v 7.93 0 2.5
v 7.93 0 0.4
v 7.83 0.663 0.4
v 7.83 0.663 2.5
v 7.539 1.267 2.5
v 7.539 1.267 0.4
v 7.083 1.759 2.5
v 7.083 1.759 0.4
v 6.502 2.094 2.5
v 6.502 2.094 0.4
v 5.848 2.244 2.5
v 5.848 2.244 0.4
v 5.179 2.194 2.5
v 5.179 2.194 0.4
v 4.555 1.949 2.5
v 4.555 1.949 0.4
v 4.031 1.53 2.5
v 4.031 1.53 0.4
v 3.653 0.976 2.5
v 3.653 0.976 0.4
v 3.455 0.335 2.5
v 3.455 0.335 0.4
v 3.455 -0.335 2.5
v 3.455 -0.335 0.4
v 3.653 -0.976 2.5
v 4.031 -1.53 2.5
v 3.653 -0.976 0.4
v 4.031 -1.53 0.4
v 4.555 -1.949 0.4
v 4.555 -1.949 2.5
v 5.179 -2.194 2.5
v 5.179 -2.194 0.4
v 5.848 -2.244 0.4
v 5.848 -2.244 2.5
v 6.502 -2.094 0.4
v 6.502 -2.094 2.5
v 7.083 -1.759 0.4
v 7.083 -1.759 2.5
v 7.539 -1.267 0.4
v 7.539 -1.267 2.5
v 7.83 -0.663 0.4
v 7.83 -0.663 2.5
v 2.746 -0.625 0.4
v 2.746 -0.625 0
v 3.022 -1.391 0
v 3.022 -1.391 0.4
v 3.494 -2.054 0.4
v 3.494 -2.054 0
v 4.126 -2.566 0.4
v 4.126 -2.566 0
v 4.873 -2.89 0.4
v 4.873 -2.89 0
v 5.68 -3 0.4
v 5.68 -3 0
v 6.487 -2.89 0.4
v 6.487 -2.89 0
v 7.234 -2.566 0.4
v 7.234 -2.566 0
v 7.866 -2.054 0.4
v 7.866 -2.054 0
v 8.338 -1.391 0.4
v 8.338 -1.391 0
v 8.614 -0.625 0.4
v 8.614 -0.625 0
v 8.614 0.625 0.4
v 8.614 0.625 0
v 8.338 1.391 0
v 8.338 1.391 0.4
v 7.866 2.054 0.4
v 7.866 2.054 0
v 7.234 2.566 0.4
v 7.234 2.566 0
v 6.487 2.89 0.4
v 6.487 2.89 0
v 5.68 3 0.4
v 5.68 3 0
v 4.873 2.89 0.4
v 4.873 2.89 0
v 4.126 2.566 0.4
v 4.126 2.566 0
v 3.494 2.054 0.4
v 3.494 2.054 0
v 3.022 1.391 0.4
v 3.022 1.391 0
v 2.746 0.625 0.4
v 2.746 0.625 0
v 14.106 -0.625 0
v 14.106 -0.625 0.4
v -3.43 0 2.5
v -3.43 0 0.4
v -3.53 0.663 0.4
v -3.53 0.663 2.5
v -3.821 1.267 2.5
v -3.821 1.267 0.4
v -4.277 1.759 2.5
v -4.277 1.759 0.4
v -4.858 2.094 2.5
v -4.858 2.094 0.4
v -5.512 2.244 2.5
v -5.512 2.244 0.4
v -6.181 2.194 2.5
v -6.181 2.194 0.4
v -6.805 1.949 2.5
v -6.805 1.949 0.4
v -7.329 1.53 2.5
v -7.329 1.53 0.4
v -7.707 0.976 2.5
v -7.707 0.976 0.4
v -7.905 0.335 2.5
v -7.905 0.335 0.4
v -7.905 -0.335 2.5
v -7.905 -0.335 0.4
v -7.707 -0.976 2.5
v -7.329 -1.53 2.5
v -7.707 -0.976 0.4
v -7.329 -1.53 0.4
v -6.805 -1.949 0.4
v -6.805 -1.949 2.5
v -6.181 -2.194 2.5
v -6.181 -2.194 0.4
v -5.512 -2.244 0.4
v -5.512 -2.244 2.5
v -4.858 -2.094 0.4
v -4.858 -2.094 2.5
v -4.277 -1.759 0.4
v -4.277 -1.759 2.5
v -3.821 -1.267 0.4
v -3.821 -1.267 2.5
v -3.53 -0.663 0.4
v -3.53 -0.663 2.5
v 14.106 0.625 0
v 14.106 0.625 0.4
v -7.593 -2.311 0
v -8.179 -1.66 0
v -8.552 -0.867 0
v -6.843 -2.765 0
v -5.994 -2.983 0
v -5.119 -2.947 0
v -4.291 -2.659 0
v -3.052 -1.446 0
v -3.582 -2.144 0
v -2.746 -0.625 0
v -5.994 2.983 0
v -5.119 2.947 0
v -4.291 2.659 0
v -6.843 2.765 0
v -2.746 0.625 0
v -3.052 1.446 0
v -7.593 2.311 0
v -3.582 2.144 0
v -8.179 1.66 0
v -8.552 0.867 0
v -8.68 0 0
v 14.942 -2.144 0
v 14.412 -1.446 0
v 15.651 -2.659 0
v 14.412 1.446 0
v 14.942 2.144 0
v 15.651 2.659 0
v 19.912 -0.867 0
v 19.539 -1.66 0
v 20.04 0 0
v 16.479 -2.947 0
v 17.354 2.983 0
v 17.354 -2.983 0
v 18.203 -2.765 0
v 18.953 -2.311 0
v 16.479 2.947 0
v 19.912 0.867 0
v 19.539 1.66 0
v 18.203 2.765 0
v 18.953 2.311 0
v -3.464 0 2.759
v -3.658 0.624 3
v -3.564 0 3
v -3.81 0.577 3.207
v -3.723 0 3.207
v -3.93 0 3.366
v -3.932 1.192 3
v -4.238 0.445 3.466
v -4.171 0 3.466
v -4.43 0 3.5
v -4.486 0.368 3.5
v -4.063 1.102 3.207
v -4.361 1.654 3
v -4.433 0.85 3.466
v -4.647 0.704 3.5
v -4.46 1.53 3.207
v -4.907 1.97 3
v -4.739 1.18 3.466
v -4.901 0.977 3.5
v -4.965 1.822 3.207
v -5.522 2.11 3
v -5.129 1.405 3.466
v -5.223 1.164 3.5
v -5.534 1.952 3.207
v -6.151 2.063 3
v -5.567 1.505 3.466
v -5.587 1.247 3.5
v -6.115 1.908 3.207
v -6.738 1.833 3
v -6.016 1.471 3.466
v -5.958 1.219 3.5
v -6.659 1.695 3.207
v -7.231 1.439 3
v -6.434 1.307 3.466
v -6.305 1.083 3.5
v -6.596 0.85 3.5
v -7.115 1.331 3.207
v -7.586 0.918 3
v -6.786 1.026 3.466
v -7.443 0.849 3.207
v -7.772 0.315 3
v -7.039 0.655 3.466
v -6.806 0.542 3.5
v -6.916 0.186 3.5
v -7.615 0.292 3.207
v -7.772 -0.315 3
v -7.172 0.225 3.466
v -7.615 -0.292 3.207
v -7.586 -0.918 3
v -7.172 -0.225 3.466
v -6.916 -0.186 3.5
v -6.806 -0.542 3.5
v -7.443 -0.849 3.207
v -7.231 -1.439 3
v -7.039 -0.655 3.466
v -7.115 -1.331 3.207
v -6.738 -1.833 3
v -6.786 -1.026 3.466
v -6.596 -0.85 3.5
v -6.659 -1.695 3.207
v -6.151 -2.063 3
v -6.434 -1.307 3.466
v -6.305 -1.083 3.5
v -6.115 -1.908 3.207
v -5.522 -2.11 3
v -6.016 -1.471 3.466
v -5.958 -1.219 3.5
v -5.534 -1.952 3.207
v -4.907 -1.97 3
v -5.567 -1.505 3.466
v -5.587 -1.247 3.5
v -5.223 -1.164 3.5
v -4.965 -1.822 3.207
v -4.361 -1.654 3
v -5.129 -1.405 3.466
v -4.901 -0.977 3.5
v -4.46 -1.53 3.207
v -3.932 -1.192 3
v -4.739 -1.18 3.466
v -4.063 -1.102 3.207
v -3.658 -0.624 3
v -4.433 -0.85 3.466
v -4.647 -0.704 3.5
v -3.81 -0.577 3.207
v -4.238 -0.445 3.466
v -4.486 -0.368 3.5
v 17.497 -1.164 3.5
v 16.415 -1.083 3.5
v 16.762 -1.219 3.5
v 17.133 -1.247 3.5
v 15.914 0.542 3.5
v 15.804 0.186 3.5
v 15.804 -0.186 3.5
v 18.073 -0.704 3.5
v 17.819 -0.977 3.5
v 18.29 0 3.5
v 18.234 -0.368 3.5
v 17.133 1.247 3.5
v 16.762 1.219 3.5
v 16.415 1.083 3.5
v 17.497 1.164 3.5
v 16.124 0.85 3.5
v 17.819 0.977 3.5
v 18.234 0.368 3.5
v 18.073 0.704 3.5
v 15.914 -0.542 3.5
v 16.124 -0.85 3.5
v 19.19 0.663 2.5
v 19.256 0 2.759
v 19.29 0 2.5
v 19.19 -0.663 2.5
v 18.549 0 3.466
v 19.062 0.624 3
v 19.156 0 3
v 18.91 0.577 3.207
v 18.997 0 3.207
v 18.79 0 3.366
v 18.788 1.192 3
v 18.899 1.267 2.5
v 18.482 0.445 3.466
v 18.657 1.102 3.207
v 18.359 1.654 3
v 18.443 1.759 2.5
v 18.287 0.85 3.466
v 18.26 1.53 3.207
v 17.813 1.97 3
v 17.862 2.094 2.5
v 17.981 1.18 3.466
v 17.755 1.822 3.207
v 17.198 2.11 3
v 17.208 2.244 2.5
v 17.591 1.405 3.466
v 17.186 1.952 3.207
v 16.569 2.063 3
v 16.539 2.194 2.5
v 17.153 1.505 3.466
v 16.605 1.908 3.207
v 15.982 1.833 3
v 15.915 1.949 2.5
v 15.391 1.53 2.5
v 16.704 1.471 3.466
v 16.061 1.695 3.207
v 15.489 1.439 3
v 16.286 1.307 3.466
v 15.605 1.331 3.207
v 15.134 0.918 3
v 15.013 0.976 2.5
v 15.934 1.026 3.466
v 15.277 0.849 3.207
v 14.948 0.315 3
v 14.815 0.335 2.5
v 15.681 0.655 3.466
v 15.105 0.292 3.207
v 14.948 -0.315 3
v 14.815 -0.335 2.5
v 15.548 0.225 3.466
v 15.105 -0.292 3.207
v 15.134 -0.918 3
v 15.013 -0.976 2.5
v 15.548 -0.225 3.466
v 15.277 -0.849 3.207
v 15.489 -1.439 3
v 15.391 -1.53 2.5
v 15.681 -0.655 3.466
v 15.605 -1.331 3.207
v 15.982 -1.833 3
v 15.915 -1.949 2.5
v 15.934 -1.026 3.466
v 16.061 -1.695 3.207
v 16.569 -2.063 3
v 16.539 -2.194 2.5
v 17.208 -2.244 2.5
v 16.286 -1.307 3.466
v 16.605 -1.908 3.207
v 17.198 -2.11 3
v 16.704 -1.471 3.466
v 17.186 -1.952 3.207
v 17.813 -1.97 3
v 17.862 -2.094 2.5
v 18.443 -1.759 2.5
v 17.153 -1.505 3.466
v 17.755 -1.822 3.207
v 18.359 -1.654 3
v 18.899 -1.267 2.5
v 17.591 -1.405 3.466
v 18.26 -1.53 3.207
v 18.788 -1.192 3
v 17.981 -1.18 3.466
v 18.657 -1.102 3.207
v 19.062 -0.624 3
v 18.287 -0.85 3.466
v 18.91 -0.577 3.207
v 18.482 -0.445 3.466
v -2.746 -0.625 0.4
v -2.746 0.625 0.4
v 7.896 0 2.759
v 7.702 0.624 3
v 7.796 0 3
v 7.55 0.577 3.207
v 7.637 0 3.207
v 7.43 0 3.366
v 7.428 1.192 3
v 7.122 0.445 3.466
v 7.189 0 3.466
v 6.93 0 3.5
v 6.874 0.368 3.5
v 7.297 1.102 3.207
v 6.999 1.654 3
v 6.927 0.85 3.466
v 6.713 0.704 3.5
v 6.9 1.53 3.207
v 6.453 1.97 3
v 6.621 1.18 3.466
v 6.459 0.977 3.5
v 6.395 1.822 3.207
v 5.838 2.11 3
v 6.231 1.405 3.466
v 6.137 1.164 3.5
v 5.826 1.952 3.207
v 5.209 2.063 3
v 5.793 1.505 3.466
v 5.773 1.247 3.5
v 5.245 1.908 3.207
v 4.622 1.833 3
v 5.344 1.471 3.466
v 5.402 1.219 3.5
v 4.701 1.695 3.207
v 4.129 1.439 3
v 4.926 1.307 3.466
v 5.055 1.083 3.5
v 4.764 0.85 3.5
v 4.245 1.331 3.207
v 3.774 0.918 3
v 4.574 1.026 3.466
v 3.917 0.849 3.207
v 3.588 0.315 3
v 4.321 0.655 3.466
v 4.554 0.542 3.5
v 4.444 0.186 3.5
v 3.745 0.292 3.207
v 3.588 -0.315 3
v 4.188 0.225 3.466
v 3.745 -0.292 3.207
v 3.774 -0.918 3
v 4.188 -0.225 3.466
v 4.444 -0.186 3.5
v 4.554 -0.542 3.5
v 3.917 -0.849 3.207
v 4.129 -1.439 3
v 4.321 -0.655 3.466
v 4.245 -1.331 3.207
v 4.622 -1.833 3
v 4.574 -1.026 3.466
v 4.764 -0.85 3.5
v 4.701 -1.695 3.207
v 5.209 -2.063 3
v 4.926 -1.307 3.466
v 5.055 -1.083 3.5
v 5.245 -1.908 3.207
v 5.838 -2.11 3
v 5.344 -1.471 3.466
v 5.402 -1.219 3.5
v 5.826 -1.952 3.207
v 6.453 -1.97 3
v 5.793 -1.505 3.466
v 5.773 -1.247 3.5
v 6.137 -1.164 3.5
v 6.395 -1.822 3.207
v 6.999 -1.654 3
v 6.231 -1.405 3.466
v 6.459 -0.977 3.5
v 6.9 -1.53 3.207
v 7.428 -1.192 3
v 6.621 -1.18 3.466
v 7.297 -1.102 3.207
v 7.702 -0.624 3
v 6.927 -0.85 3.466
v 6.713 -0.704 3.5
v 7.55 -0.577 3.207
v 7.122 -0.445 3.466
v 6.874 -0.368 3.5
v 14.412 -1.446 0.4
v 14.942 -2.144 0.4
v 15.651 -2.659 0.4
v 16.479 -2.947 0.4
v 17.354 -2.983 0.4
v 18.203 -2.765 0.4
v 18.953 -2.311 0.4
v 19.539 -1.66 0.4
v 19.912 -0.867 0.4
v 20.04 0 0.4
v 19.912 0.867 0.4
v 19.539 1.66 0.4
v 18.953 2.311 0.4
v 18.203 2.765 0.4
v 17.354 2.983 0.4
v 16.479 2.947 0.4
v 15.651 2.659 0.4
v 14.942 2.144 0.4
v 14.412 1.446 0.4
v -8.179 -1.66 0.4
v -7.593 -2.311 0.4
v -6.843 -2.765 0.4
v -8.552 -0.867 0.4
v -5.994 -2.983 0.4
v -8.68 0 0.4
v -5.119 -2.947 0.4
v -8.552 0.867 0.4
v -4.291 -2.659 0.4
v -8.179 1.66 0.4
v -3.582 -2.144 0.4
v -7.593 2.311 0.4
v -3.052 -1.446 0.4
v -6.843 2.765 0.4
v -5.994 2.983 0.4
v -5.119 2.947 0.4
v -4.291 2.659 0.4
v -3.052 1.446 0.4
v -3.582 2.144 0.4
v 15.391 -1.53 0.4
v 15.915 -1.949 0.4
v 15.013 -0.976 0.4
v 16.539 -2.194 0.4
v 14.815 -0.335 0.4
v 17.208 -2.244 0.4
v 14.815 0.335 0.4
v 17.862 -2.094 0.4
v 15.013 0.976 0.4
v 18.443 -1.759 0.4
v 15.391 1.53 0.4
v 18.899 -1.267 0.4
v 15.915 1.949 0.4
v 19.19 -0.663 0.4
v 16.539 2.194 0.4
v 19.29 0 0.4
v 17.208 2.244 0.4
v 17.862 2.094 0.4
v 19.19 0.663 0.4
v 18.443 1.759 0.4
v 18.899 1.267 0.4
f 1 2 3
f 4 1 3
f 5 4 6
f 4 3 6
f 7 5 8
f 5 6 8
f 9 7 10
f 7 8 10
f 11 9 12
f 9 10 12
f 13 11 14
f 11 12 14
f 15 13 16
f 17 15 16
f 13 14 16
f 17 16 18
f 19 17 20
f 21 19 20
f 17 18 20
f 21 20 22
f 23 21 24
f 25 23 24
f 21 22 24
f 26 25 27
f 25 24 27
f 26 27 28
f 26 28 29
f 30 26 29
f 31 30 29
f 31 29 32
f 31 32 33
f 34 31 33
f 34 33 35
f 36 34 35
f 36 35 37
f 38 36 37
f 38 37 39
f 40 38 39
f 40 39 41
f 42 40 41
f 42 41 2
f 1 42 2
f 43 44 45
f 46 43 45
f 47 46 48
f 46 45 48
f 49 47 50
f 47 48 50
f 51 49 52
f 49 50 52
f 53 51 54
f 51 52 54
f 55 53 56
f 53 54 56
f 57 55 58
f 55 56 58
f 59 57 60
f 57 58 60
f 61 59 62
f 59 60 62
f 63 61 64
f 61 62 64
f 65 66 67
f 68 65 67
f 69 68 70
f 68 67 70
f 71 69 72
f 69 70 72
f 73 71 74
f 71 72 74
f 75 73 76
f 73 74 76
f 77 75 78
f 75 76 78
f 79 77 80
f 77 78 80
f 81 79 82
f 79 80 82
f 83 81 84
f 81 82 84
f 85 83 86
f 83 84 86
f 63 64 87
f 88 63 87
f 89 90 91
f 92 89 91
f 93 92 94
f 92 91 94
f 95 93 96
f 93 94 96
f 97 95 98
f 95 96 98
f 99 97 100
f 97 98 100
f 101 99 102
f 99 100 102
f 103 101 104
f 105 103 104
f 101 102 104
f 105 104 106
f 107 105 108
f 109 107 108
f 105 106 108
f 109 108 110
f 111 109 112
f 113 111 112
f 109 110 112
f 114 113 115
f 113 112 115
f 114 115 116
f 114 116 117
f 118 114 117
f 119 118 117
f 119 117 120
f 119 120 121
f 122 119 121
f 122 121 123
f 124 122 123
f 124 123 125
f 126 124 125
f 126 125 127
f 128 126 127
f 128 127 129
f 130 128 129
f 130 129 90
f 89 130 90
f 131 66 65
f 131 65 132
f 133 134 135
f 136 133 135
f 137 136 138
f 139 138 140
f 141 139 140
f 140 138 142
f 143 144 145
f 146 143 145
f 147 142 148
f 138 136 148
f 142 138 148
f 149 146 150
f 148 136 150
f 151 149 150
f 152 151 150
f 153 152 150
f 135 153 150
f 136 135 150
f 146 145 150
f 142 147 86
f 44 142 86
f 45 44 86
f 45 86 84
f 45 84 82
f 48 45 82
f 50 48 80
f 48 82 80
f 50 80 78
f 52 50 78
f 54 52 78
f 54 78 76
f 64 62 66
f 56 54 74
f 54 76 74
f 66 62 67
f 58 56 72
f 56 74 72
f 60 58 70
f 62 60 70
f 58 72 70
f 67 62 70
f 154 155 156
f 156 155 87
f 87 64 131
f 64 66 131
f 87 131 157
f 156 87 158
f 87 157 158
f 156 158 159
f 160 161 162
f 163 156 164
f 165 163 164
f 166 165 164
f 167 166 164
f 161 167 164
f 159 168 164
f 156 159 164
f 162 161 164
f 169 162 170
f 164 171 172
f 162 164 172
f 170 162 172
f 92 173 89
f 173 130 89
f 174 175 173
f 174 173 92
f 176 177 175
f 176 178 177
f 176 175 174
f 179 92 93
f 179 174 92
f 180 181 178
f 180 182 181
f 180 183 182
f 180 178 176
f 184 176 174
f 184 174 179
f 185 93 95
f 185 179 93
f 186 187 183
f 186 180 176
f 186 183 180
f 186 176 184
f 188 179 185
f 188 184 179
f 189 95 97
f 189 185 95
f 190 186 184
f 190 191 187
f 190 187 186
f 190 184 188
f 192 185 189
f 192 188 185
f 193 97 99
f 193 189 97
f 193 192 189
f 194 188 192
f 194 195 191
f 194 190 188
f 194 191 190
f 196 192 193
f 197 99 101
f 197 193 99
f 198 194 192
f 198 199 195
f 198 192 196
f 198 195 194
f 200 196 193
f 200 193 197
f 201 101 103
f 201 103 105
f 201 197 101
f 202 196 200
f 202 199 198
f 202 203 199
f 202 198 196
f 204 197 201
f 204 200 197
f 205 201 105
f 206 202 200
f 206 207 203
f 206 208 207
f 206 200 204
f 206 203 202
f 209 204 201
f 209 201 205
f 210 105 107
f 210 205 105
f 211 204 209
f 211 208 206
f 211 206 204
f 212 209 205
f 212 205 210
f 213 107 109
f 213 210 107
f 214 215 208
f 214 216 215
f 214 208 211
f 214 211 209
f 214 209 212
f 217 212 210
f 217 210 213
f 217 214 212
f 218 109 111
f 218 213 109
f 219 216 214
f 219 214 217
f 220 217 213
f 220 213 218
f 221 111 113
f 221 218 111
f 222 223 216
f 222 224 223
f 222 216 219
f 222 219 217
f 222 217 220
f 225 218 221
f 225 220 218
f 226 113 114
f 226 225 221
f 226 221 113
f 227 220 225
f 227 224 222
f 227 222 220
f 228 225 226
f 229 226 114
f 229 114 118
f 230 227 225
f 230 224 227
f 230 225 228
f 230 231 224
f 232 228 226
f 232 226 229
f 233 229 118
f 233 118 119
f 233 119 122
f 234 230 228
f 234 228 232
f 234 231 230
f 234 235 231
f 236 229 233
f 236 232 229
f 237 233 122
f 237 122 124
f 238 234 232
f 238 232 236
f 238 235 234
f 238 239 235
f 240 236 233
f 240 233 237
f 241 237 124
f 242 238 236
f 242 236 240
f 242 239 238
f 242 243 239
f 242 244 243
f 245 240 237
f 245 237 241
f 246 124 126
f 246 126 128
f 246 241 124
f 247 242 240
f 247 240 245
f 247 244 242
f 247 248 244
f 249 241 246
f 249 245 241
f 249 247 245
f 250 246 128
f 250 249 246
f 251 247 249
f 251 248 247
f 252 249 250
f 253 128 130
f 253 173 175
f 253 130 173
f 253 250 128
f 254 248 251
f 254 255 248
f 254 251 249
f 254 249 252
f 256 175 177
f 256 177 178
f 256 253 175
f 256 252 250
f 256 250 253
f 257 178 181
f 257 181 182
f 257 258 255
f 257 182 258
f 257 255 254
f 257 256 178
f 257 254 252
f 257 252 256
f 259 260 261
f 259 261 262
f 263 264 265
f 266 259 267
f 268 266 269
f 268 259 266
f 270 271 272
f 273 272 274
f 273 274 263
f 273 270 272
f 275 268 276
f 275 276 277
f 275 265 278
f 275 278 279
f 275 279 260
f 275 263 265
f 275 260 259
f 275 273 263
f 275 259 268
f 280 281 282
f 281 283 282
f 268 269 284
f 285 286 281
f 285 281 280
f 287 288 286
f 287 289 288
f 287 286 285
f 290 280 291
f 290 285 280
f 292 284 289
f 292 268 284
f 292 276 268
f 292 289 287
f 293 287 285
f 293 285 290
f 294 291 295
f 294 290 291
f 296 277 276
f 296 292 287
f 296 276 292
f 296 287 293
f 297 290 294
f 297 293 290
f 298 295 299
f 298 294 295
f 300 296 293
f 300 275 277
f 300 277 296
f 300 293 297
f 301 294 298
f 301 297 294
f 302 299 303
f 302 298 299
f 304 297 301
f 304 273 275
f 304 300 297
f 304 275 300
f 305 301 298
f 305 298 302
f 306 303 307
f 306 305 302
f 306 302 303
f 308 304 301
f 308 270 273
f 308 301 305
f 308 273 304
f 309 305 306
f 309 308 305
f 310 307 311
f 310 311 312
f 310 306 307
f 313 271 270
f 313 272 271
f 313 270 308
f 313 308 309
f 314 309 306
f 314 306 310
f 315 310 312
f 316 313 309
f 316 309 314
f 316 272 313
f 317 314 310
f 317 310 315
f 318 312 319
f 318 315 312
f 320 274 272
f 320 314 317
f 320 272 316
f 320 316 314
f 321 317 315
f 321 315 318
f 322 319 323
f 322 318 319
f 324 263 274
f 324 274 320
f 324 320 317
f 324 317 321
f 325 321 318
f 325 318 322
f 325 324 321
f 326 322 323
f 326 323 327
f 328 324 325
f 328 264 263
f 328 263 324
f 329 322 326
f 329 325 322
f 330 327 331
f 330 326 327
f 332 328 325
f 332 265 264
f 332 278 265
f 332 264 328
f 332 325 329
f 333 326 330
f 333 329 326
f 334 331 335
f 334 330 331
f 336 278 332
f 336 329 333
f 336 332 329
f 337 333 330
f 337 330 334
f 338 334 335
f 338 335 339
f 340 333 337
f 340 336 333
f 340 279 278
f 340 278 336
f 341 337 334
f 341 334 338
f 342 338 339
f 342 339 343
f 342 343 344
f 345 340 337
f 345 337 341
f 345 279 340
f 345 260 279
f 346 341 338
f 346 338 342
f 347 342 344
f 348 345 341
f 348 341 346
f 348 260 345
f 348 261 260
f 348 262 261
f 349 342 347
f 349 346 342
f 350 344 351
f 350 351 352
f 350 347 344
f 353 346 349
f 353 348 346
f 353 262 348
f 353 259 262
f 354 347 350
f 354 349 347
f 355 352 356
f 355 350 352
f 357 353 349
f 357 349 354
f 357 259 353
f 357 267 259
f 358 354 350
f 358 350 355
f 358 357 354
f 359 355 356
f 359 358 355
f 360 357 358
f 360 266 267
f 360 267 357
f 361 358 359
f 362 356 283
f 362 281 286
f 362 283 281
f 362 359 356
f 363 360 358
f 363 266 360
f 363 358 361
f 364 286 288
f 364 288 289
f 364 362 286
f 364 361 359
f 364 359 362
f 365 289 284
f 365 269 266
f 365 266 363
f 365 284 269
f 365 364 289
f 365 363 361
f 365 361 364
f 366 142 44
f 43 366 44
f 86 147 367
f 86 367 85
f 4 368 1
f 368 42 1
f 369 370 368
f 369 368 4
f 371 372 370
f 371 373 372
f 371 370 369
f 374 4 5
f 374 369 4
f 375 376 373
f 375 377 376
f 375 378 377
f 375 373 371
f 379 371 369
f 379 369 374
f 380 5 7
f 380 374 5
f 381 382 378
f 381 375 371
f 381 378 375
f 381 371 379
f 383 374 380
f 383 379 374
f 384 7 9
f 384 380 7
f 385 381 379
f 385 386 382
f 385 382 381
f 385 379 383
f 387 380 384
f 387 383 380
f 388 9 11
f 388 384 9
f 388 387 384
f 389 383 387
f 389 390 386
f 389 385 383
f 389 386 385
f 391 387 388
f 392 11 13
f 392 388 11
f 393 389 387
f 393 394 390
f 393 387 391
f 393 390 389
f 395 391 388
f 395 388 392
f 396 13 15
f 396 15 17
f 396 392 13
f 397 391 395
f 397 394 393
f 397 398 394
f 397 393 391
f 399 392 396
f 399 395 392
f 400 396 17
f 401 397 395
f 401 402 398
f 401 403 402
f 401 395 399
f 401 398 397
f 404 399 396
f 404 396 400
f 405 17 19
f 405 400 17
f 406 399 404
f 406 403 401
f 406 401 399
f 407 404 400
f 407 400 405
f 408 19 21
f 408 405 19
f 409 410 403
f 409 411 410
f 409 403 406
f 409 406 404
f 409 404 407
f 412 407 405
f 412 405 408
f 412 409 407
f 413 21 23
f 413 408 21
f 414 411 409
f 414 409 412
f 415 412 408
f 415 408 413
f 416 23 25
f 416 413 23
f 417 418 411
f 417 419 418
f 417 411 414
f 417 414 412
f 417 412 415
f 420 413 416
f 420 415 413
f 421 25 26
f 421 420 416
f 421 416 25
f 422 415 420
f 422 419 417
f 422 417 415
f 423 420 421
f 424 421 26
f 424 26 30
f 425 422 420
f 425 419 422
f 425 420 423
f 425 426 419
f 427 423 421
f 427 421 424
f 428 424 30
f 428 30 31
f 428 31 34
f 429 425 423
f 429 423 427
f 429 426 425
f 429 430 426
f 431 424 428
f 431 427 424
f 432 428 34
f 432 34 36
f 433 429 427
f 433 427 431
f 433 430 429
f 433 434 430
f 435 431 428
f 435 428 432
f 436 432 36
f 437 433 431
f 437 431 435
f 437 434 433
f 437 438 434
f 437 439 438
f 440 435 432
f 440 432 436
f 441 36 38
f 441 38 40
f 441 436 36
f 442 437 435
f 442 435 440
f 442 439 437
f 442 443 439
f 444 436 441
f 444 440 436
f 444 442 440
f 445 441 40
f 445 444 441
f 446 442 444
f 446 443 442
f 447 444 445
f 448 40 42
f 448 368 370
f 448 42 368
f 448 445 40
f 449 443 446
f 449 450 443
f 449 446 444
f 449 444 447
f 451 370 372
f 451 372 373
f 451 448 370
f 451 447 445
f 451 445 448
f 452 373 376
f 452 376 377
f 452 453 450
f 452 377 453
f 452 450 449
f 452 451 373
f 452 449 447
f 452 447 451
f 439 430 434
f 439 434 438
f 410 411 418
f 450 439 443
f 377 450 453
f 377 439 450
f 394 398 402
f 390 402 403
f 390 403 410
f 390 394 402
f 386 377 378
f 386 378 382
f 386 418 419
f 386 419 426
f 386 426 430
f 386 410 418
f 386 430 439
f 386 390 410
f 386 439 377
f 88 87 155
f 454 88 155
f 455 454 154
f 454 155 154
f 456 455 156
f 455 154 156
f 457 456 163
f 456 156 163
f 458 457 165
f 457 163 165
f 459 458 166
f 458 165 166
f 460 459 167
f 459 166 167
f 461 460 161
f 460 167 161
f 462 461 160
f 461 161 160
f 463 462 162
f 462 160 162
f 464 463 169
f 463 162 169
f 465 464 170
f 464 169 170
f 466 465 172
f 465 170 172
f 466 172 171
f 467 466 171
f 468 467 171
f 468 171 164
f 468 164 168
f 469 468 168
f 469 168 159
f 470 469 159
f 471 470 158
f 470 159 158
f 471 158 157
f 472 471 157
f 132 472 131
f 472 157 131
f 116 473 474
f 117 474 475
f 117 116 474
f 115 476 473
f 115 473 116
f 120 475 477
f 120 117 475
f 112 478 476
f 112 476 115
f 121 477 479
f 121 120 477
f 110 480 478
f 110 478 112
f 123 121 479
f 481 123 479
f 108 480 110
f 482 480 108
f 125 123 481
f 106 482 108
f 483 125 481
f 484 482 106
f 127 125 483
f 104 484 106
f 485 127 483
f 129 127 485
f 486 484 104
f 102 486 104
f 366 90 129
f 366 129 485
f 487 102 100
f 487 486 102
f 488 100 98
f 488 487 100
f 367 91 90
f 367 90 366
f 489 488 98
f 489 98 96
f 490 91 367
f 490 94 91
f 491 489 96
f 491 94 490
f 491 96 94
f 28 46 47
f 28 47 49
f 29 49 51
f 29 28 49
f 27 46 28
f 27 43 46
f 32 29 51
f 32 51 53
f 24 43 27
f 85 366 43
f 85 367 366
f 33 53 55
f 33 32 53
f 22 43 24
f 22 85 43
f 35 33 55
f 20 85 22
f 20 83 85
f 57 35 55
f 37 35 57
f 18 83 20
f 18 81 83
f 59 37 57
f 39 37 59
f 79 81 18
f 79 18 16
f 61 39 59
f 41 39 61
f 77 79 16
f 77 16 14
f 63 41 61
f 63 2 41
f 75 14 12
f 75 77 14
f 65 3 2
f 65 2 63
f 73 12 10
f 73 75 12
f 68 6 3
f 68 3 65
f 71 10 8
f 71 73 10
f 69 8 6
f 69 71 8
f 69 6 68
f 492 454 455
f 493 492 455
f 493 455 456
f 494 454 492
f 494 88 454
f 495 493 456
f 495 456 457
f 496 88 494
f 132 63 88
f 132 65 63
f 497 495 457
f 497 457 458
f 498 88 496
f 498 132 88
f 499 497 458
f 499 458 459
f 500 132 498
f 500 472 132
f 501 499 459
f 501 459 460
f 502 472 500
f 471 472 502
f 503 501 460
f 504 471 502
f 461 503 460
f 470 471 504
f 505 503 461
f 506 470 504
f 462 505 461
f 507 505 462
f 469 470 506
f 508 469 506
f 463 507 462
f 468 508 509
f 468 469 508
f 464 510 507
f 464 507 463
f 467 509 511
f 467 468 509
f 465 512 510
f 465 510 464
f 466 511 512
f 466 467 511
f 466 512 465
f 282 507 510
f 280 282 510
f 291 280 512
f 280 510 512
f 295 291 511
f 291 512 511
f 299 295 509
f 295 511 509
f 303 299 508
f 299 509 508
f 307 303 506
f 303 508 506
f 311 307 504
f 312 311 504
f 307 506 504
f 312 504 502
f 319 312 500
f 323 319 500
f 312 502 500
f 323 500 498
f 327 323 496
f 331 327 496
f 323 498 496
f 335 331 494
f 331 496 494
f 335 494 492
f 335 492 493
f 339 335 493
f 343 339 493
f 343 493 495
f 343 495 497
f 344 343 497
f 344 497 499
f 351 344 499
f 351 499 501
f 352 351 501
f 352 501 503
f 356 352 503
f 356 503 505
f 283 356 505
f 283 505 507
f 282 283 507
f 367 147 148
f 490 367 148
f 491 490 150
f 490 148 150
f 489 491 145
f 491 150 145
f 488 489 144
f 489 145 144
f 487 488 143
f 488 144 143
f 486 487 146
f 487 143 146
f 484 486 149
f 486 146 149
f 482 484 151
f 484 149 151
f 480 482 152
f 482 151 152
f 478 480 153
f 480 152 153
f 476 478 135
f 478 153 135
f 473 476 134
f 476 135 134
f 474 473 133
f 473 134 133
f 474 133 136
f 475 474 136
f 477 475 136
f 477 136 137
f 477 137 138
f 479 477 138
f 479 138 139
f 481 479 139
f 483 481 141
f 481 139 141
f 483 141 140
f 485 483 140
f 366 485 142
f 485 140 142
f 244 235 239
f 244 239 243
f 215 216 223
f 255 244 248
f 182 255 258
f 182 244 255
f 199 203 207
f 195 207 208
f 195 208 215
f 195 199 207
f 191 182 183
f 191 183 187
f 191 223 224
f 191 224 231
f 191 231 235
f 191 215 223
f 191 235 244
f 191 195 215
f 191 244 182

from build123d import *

# Parameters (mm, degrees)
PAD_DEPTH    = 0.4
SKETCH001_R  = 2.25
PAD001_DEPTH = 3.5
FILLET_R     = 1


with BuildPart() as part:
    # Sketch → Pad (new body)
    with BuildSketch(Plane.XY):
        with BuildLine():
            ThreePointArc((-2.745826, 0.625), (-8.68, 0), (-2.745826, -0.625))
            Line((-2.745826, -0.625), (2.745826, -0.625))
            ThreePointArc((2.745826, -0.625), (5.68, -3), (8.614174, -0.625))
            Line((8.614174, -0.625), (14.105826, -0.625))
            ThreePointArc((14.105826, -0.625), (20.04, 0), (14.105826, 0.625))
            Line((8.614174, 0.625), (14.105826, 0.625))
            ThreePointArc((8.614174, 0.625), (5.68, 3), (2.745826, 0.625))
            Line((-2.745826, 0.625), (2.745826, 0.625))
        make_face()
    extrude(amount=PAD_DEPTH)

    # Sketch001 → Pad001 (join)
    with BuildSketch(Plane.XY):
        with Locations((-5.68, 0)):
            Circle(SKETCH001_R)
        with Locations((5.68, 0)):
            Circle(SKETCH001_R)
        with Locations((17.04, 0)):
            Circle(SKETCH001_R)
    extrude(amount=PAD001_DEPTH)

    # Fillet
    fillet_edges = [part.edges().sort_by_distance(p)[0] for p in [
        (-7.93, 0, 3.5),
        (3.43, 0, 3.5),
        (14.79, 0, 3.5),
    ]]
    fillet(fillet_edges, radius=FILLET_R)


solid = part.part
